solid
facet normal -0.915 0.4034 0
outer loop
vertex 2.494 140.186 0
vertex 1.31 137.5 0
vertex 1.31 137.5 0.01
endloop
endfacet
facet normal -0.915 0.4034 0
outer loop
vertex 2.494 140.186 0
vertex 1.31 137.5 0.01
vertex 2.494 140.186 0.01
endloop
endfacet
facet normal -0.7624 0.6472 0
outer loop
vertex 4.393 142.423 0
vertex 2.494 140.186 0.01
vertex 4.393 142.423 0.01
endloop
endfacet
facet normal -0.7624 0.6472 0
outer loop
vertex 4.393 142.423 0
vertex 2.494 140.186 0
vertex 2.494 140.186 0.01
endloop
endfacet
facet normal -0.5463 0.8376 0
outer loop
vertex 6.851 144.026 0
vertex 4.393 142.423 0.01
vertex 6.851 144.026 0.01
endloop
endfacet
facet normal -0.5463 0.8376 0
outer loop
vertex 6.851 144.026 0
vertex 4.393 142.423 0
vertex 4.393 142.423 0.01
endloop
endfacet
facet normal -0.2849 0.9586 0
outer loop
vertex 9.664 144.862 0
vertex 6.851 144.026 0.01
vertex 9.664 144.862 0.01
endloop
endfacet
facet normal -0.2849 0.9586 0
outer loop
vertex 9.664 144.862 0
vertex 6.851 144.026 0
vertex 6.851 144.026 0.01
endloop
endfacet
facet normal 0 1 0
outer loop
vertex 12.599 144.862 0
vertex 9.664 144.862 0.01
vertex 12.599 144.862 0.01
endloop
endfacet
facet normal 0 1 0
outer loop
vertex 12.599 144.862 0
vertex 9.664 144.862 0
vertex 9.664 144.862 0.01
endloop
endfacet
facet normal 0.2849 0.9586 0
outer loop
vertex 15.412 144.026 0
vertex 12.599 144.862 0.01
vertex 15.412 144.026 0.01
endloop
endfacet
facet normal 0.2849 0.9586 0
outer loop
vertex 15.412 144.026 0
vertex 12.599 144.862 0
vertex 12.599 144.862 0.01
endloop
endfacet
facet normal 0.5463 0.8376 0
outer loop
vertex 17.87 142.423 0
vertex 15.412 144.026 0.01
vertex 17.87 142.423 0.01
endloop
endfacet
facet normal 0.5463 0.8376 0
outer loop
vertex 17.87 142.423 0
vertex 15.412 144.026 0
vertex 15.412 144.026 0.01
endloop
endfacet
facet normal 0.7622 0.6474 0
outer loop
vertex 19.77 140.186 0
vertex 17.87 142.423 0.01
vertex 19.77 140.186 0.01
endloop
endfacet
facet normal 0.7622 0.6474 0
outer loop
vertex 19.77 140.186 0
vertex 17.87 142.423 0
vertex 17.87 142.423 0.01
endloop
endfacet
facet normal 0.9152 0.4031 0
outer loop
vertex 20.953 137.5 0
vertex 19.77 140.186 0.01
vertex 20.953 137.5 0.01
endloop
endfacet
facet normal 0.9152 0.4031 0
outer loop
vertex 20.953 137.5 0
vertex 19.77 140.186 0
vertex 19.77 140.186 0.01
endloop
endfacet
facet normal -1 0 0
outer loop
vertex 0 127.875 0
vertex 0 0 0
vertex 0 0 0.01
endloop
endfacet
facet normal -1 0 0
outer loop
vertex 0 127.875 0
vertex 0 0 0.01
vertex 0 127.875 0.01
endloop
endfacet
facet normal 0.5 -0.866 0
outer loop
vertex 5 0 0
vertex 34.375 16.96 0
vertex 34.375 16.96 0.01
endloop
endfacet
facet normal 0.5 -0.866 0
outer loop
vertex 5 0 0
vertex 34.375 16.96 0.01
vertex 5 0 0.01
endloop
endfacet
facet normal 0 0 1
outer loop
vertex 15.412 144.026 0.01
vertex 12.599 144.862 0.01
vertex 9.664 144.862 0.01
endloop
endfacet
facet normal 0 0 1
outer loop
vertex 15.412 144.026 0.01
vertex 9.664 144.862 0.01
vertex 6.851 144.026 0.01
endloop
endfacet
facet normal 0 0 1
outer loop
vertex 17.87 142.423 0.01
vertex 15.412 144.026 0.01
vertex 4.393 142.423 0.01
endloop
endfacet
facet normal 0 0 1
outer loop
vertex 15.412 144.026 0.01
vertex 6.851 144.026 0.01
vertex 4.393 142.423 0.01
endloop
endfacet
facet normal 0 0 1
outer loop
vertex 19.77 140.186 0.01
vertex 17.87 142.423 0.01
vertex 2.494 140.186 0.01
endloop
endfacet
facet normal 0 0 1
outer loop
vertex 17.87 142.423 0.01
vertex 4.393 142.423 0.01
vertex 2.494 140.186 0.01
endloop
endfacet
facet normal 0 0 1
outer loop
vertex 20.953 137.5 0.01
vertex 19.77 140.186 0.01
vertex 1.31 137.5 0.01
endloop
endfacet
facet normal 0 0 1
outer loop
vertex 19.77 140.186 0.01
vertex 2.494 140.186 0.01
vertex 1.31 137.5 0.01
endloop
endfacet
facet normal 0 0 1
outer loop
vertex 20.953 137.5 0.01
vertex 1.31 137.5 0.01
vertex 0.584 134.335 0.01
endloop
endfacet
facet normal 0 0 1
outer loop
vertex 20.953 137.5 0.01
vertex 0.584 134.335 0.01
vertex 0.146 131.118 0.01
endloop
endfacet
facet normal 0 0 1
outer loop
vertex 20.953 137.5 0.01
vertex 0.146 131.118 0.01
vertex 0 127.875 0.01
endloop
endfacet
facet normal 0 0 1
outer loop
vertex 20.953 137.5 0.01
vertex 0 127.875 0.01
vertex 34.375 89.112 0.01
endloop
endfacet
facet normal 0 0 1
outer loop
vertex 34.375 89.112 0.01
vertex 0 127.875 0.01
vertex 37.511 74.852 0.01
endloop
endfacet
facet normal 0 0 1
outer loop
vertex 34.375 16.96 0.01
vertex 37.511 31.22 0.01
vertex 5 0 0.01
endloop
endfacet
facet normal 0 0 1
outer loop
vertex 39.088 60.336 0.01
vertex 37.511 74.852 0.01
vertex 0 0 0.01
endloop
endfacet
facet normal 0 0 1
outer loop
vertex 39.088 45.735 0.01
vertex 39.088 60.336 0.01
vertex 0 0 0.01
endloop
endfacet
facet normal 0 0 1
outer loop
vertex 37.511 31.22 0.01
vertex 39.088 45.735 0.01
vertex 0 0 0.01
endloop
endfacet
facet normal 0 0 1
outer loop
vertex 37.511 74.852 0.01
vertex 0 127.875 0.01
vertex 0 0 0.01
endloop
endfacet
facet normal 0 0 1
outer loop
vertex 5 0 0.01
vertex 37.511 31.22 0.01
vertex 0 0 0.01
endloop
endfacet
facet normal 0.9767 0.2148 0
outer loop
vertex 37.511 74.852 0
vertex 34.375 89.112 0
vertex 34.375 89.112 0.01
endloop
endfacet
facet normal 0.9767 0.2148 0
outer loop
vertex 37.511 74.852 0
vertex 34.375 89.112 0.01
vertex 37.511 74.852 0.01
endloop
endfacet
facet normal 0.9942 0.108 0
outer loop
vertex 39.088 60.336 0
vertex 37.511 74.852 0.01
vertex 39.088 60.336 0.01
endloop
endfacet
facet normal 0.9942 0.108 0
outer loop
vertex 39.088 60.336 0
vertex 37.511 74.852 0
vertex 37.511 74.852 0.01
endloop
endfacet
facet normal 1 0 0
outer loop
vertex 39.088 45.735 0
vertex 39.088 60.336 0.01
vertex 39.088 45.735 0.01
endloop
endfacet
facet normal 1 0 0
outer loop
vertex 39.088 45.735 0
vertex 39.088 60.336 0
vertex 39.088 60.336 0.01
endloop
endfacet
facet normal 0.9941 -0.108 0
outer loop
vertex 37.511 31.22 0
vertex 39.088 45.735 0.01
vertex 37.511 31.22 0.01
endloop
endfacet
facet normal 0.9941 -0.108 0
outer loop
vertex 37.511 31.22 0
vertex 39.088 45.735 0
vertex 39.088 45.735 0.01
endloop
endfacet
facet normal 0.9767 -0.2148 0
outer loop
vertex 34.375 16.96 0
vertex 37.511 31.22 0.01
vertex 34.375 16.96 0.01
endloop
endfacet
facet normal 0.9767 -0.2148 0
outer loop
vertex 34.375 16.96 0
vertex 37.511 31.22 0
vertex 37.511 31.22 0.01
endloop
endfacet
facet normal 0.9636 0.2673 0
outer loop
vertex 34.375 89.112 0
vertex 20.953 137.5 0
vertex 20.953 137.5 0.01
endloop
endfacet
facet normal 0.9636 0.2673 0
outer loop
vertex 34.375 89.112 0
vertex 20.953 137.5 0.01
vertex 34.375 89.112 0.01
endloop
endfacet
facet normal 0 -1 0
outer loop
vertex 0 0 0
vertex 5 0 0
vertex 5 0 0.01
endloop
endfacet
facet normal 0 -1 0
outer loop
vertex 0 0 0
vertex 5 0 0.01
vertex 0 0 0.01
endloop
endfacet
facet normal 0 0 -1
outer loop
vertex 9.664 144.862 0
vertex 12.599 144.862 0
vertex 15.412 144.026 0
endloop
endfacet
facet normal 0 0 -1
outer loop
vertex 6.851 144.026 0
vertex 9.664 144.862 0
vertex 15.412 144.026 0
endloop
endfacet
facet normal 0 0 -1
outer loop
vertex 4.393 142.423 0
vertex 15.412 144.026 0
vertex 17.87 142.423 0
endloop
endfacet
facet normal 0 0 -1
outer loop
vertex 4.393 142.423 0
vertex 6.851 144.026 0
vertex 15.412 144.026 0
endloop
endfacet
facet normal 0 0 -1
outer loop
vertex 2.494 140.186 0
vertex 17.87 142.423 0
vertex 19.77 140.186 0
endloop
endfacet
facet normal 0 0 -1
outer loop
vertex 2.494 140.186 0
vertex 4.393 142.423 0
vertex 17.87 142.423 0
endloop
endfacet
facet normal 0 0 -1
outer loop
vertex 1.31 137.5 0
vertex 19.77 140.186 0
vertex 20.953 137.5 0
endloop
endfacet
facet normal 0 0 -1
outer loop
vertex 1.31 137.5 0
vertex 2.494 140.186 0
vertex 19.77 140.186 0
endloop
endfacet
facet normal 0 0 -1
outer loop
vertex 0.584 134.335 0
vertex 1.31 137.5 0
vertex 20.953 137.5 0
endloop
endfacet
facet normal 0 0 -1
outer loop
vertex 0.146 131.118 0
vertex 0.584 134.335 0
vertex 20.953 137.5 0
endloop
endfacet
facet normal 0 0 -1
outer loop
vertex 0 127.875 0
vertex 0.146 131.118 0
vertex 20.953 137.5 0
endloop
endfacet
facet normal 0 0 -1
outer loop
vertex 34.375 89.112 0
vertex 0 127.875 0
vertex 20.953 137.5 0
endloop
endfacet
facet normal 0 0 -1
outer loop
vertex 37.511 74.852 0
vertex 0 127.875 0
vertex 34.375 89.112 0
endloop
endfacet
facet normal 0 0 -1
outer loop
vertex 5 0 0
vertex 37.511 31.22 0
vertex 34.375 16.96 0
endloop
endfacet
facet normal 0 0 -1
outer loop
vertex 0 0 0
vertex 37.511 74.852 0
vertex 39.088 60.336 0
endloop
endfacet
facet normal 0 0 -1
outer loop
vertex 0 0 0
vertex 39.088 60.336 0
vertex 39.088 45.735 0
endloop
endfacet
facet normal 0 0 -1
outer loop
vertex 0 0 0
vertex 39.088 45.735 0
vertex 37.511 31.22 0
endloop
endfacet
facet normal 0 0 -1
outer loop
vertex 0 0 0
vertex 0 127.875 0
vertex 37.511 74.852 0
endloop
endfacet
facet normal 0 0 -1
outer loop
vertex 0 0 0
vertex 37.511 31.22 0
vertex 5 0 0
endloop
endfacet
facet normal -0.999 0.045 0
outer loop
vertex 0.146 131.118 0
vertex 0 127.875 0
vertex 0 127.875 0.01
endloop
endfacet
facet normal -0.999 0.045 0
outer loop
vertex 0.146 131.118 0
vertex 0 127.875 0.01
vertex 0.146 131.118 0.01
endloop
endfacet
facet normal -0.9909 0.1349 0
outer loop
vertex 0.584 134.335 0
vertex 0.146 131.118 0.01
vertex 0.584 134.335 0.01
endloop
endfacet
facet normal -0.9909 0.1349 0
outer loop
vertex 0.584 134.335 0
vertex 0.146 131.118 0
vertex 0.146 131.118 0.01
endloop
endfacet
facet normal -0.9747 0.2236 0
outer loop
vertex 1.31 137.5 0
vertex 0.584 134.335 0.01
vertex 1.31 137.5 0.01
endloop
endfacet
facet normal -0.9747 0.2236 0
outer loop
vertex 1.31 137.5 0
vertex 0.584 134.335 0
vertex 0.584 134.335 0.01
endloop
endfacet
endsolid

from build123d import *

# Parameters (mm, degrees)
BOSS_EXTRUDE1_DEPTH = 0.01


with BuildPart() as part:
    # Sketch1 → Boss-Extrude1 (new body)
    with BuildSketch(Plane(origin=(0, 0, 0), x_dir=(0, 1, 0), z_dir=(0, 0, 1))):
        with BuildLine():
            Line((0, 0), (127.875, 0))
            ThreePointArc((127.875, 0), (132.731880588, -0.329044492), (137.5, -1.310164565))
            ThreePointArc((137.5, -1.310164565), (144.967977443, -11.131593136), (137.5, -20.953021708))
            Line((137.5, -20.953021708), (89.111859788, -34.375))
            ThreePointArc((89.111859788, -34.375), (53.035761973, -39.285714286), (16.959664157, -34.375))
            Line((16.959664157, -34.375), (0, -5))
            Line((0, -5), (0, 0))
        make_face()
    extrude(amount=BOSS_EXTRUDE1_DEPTH)


solid = part.part
